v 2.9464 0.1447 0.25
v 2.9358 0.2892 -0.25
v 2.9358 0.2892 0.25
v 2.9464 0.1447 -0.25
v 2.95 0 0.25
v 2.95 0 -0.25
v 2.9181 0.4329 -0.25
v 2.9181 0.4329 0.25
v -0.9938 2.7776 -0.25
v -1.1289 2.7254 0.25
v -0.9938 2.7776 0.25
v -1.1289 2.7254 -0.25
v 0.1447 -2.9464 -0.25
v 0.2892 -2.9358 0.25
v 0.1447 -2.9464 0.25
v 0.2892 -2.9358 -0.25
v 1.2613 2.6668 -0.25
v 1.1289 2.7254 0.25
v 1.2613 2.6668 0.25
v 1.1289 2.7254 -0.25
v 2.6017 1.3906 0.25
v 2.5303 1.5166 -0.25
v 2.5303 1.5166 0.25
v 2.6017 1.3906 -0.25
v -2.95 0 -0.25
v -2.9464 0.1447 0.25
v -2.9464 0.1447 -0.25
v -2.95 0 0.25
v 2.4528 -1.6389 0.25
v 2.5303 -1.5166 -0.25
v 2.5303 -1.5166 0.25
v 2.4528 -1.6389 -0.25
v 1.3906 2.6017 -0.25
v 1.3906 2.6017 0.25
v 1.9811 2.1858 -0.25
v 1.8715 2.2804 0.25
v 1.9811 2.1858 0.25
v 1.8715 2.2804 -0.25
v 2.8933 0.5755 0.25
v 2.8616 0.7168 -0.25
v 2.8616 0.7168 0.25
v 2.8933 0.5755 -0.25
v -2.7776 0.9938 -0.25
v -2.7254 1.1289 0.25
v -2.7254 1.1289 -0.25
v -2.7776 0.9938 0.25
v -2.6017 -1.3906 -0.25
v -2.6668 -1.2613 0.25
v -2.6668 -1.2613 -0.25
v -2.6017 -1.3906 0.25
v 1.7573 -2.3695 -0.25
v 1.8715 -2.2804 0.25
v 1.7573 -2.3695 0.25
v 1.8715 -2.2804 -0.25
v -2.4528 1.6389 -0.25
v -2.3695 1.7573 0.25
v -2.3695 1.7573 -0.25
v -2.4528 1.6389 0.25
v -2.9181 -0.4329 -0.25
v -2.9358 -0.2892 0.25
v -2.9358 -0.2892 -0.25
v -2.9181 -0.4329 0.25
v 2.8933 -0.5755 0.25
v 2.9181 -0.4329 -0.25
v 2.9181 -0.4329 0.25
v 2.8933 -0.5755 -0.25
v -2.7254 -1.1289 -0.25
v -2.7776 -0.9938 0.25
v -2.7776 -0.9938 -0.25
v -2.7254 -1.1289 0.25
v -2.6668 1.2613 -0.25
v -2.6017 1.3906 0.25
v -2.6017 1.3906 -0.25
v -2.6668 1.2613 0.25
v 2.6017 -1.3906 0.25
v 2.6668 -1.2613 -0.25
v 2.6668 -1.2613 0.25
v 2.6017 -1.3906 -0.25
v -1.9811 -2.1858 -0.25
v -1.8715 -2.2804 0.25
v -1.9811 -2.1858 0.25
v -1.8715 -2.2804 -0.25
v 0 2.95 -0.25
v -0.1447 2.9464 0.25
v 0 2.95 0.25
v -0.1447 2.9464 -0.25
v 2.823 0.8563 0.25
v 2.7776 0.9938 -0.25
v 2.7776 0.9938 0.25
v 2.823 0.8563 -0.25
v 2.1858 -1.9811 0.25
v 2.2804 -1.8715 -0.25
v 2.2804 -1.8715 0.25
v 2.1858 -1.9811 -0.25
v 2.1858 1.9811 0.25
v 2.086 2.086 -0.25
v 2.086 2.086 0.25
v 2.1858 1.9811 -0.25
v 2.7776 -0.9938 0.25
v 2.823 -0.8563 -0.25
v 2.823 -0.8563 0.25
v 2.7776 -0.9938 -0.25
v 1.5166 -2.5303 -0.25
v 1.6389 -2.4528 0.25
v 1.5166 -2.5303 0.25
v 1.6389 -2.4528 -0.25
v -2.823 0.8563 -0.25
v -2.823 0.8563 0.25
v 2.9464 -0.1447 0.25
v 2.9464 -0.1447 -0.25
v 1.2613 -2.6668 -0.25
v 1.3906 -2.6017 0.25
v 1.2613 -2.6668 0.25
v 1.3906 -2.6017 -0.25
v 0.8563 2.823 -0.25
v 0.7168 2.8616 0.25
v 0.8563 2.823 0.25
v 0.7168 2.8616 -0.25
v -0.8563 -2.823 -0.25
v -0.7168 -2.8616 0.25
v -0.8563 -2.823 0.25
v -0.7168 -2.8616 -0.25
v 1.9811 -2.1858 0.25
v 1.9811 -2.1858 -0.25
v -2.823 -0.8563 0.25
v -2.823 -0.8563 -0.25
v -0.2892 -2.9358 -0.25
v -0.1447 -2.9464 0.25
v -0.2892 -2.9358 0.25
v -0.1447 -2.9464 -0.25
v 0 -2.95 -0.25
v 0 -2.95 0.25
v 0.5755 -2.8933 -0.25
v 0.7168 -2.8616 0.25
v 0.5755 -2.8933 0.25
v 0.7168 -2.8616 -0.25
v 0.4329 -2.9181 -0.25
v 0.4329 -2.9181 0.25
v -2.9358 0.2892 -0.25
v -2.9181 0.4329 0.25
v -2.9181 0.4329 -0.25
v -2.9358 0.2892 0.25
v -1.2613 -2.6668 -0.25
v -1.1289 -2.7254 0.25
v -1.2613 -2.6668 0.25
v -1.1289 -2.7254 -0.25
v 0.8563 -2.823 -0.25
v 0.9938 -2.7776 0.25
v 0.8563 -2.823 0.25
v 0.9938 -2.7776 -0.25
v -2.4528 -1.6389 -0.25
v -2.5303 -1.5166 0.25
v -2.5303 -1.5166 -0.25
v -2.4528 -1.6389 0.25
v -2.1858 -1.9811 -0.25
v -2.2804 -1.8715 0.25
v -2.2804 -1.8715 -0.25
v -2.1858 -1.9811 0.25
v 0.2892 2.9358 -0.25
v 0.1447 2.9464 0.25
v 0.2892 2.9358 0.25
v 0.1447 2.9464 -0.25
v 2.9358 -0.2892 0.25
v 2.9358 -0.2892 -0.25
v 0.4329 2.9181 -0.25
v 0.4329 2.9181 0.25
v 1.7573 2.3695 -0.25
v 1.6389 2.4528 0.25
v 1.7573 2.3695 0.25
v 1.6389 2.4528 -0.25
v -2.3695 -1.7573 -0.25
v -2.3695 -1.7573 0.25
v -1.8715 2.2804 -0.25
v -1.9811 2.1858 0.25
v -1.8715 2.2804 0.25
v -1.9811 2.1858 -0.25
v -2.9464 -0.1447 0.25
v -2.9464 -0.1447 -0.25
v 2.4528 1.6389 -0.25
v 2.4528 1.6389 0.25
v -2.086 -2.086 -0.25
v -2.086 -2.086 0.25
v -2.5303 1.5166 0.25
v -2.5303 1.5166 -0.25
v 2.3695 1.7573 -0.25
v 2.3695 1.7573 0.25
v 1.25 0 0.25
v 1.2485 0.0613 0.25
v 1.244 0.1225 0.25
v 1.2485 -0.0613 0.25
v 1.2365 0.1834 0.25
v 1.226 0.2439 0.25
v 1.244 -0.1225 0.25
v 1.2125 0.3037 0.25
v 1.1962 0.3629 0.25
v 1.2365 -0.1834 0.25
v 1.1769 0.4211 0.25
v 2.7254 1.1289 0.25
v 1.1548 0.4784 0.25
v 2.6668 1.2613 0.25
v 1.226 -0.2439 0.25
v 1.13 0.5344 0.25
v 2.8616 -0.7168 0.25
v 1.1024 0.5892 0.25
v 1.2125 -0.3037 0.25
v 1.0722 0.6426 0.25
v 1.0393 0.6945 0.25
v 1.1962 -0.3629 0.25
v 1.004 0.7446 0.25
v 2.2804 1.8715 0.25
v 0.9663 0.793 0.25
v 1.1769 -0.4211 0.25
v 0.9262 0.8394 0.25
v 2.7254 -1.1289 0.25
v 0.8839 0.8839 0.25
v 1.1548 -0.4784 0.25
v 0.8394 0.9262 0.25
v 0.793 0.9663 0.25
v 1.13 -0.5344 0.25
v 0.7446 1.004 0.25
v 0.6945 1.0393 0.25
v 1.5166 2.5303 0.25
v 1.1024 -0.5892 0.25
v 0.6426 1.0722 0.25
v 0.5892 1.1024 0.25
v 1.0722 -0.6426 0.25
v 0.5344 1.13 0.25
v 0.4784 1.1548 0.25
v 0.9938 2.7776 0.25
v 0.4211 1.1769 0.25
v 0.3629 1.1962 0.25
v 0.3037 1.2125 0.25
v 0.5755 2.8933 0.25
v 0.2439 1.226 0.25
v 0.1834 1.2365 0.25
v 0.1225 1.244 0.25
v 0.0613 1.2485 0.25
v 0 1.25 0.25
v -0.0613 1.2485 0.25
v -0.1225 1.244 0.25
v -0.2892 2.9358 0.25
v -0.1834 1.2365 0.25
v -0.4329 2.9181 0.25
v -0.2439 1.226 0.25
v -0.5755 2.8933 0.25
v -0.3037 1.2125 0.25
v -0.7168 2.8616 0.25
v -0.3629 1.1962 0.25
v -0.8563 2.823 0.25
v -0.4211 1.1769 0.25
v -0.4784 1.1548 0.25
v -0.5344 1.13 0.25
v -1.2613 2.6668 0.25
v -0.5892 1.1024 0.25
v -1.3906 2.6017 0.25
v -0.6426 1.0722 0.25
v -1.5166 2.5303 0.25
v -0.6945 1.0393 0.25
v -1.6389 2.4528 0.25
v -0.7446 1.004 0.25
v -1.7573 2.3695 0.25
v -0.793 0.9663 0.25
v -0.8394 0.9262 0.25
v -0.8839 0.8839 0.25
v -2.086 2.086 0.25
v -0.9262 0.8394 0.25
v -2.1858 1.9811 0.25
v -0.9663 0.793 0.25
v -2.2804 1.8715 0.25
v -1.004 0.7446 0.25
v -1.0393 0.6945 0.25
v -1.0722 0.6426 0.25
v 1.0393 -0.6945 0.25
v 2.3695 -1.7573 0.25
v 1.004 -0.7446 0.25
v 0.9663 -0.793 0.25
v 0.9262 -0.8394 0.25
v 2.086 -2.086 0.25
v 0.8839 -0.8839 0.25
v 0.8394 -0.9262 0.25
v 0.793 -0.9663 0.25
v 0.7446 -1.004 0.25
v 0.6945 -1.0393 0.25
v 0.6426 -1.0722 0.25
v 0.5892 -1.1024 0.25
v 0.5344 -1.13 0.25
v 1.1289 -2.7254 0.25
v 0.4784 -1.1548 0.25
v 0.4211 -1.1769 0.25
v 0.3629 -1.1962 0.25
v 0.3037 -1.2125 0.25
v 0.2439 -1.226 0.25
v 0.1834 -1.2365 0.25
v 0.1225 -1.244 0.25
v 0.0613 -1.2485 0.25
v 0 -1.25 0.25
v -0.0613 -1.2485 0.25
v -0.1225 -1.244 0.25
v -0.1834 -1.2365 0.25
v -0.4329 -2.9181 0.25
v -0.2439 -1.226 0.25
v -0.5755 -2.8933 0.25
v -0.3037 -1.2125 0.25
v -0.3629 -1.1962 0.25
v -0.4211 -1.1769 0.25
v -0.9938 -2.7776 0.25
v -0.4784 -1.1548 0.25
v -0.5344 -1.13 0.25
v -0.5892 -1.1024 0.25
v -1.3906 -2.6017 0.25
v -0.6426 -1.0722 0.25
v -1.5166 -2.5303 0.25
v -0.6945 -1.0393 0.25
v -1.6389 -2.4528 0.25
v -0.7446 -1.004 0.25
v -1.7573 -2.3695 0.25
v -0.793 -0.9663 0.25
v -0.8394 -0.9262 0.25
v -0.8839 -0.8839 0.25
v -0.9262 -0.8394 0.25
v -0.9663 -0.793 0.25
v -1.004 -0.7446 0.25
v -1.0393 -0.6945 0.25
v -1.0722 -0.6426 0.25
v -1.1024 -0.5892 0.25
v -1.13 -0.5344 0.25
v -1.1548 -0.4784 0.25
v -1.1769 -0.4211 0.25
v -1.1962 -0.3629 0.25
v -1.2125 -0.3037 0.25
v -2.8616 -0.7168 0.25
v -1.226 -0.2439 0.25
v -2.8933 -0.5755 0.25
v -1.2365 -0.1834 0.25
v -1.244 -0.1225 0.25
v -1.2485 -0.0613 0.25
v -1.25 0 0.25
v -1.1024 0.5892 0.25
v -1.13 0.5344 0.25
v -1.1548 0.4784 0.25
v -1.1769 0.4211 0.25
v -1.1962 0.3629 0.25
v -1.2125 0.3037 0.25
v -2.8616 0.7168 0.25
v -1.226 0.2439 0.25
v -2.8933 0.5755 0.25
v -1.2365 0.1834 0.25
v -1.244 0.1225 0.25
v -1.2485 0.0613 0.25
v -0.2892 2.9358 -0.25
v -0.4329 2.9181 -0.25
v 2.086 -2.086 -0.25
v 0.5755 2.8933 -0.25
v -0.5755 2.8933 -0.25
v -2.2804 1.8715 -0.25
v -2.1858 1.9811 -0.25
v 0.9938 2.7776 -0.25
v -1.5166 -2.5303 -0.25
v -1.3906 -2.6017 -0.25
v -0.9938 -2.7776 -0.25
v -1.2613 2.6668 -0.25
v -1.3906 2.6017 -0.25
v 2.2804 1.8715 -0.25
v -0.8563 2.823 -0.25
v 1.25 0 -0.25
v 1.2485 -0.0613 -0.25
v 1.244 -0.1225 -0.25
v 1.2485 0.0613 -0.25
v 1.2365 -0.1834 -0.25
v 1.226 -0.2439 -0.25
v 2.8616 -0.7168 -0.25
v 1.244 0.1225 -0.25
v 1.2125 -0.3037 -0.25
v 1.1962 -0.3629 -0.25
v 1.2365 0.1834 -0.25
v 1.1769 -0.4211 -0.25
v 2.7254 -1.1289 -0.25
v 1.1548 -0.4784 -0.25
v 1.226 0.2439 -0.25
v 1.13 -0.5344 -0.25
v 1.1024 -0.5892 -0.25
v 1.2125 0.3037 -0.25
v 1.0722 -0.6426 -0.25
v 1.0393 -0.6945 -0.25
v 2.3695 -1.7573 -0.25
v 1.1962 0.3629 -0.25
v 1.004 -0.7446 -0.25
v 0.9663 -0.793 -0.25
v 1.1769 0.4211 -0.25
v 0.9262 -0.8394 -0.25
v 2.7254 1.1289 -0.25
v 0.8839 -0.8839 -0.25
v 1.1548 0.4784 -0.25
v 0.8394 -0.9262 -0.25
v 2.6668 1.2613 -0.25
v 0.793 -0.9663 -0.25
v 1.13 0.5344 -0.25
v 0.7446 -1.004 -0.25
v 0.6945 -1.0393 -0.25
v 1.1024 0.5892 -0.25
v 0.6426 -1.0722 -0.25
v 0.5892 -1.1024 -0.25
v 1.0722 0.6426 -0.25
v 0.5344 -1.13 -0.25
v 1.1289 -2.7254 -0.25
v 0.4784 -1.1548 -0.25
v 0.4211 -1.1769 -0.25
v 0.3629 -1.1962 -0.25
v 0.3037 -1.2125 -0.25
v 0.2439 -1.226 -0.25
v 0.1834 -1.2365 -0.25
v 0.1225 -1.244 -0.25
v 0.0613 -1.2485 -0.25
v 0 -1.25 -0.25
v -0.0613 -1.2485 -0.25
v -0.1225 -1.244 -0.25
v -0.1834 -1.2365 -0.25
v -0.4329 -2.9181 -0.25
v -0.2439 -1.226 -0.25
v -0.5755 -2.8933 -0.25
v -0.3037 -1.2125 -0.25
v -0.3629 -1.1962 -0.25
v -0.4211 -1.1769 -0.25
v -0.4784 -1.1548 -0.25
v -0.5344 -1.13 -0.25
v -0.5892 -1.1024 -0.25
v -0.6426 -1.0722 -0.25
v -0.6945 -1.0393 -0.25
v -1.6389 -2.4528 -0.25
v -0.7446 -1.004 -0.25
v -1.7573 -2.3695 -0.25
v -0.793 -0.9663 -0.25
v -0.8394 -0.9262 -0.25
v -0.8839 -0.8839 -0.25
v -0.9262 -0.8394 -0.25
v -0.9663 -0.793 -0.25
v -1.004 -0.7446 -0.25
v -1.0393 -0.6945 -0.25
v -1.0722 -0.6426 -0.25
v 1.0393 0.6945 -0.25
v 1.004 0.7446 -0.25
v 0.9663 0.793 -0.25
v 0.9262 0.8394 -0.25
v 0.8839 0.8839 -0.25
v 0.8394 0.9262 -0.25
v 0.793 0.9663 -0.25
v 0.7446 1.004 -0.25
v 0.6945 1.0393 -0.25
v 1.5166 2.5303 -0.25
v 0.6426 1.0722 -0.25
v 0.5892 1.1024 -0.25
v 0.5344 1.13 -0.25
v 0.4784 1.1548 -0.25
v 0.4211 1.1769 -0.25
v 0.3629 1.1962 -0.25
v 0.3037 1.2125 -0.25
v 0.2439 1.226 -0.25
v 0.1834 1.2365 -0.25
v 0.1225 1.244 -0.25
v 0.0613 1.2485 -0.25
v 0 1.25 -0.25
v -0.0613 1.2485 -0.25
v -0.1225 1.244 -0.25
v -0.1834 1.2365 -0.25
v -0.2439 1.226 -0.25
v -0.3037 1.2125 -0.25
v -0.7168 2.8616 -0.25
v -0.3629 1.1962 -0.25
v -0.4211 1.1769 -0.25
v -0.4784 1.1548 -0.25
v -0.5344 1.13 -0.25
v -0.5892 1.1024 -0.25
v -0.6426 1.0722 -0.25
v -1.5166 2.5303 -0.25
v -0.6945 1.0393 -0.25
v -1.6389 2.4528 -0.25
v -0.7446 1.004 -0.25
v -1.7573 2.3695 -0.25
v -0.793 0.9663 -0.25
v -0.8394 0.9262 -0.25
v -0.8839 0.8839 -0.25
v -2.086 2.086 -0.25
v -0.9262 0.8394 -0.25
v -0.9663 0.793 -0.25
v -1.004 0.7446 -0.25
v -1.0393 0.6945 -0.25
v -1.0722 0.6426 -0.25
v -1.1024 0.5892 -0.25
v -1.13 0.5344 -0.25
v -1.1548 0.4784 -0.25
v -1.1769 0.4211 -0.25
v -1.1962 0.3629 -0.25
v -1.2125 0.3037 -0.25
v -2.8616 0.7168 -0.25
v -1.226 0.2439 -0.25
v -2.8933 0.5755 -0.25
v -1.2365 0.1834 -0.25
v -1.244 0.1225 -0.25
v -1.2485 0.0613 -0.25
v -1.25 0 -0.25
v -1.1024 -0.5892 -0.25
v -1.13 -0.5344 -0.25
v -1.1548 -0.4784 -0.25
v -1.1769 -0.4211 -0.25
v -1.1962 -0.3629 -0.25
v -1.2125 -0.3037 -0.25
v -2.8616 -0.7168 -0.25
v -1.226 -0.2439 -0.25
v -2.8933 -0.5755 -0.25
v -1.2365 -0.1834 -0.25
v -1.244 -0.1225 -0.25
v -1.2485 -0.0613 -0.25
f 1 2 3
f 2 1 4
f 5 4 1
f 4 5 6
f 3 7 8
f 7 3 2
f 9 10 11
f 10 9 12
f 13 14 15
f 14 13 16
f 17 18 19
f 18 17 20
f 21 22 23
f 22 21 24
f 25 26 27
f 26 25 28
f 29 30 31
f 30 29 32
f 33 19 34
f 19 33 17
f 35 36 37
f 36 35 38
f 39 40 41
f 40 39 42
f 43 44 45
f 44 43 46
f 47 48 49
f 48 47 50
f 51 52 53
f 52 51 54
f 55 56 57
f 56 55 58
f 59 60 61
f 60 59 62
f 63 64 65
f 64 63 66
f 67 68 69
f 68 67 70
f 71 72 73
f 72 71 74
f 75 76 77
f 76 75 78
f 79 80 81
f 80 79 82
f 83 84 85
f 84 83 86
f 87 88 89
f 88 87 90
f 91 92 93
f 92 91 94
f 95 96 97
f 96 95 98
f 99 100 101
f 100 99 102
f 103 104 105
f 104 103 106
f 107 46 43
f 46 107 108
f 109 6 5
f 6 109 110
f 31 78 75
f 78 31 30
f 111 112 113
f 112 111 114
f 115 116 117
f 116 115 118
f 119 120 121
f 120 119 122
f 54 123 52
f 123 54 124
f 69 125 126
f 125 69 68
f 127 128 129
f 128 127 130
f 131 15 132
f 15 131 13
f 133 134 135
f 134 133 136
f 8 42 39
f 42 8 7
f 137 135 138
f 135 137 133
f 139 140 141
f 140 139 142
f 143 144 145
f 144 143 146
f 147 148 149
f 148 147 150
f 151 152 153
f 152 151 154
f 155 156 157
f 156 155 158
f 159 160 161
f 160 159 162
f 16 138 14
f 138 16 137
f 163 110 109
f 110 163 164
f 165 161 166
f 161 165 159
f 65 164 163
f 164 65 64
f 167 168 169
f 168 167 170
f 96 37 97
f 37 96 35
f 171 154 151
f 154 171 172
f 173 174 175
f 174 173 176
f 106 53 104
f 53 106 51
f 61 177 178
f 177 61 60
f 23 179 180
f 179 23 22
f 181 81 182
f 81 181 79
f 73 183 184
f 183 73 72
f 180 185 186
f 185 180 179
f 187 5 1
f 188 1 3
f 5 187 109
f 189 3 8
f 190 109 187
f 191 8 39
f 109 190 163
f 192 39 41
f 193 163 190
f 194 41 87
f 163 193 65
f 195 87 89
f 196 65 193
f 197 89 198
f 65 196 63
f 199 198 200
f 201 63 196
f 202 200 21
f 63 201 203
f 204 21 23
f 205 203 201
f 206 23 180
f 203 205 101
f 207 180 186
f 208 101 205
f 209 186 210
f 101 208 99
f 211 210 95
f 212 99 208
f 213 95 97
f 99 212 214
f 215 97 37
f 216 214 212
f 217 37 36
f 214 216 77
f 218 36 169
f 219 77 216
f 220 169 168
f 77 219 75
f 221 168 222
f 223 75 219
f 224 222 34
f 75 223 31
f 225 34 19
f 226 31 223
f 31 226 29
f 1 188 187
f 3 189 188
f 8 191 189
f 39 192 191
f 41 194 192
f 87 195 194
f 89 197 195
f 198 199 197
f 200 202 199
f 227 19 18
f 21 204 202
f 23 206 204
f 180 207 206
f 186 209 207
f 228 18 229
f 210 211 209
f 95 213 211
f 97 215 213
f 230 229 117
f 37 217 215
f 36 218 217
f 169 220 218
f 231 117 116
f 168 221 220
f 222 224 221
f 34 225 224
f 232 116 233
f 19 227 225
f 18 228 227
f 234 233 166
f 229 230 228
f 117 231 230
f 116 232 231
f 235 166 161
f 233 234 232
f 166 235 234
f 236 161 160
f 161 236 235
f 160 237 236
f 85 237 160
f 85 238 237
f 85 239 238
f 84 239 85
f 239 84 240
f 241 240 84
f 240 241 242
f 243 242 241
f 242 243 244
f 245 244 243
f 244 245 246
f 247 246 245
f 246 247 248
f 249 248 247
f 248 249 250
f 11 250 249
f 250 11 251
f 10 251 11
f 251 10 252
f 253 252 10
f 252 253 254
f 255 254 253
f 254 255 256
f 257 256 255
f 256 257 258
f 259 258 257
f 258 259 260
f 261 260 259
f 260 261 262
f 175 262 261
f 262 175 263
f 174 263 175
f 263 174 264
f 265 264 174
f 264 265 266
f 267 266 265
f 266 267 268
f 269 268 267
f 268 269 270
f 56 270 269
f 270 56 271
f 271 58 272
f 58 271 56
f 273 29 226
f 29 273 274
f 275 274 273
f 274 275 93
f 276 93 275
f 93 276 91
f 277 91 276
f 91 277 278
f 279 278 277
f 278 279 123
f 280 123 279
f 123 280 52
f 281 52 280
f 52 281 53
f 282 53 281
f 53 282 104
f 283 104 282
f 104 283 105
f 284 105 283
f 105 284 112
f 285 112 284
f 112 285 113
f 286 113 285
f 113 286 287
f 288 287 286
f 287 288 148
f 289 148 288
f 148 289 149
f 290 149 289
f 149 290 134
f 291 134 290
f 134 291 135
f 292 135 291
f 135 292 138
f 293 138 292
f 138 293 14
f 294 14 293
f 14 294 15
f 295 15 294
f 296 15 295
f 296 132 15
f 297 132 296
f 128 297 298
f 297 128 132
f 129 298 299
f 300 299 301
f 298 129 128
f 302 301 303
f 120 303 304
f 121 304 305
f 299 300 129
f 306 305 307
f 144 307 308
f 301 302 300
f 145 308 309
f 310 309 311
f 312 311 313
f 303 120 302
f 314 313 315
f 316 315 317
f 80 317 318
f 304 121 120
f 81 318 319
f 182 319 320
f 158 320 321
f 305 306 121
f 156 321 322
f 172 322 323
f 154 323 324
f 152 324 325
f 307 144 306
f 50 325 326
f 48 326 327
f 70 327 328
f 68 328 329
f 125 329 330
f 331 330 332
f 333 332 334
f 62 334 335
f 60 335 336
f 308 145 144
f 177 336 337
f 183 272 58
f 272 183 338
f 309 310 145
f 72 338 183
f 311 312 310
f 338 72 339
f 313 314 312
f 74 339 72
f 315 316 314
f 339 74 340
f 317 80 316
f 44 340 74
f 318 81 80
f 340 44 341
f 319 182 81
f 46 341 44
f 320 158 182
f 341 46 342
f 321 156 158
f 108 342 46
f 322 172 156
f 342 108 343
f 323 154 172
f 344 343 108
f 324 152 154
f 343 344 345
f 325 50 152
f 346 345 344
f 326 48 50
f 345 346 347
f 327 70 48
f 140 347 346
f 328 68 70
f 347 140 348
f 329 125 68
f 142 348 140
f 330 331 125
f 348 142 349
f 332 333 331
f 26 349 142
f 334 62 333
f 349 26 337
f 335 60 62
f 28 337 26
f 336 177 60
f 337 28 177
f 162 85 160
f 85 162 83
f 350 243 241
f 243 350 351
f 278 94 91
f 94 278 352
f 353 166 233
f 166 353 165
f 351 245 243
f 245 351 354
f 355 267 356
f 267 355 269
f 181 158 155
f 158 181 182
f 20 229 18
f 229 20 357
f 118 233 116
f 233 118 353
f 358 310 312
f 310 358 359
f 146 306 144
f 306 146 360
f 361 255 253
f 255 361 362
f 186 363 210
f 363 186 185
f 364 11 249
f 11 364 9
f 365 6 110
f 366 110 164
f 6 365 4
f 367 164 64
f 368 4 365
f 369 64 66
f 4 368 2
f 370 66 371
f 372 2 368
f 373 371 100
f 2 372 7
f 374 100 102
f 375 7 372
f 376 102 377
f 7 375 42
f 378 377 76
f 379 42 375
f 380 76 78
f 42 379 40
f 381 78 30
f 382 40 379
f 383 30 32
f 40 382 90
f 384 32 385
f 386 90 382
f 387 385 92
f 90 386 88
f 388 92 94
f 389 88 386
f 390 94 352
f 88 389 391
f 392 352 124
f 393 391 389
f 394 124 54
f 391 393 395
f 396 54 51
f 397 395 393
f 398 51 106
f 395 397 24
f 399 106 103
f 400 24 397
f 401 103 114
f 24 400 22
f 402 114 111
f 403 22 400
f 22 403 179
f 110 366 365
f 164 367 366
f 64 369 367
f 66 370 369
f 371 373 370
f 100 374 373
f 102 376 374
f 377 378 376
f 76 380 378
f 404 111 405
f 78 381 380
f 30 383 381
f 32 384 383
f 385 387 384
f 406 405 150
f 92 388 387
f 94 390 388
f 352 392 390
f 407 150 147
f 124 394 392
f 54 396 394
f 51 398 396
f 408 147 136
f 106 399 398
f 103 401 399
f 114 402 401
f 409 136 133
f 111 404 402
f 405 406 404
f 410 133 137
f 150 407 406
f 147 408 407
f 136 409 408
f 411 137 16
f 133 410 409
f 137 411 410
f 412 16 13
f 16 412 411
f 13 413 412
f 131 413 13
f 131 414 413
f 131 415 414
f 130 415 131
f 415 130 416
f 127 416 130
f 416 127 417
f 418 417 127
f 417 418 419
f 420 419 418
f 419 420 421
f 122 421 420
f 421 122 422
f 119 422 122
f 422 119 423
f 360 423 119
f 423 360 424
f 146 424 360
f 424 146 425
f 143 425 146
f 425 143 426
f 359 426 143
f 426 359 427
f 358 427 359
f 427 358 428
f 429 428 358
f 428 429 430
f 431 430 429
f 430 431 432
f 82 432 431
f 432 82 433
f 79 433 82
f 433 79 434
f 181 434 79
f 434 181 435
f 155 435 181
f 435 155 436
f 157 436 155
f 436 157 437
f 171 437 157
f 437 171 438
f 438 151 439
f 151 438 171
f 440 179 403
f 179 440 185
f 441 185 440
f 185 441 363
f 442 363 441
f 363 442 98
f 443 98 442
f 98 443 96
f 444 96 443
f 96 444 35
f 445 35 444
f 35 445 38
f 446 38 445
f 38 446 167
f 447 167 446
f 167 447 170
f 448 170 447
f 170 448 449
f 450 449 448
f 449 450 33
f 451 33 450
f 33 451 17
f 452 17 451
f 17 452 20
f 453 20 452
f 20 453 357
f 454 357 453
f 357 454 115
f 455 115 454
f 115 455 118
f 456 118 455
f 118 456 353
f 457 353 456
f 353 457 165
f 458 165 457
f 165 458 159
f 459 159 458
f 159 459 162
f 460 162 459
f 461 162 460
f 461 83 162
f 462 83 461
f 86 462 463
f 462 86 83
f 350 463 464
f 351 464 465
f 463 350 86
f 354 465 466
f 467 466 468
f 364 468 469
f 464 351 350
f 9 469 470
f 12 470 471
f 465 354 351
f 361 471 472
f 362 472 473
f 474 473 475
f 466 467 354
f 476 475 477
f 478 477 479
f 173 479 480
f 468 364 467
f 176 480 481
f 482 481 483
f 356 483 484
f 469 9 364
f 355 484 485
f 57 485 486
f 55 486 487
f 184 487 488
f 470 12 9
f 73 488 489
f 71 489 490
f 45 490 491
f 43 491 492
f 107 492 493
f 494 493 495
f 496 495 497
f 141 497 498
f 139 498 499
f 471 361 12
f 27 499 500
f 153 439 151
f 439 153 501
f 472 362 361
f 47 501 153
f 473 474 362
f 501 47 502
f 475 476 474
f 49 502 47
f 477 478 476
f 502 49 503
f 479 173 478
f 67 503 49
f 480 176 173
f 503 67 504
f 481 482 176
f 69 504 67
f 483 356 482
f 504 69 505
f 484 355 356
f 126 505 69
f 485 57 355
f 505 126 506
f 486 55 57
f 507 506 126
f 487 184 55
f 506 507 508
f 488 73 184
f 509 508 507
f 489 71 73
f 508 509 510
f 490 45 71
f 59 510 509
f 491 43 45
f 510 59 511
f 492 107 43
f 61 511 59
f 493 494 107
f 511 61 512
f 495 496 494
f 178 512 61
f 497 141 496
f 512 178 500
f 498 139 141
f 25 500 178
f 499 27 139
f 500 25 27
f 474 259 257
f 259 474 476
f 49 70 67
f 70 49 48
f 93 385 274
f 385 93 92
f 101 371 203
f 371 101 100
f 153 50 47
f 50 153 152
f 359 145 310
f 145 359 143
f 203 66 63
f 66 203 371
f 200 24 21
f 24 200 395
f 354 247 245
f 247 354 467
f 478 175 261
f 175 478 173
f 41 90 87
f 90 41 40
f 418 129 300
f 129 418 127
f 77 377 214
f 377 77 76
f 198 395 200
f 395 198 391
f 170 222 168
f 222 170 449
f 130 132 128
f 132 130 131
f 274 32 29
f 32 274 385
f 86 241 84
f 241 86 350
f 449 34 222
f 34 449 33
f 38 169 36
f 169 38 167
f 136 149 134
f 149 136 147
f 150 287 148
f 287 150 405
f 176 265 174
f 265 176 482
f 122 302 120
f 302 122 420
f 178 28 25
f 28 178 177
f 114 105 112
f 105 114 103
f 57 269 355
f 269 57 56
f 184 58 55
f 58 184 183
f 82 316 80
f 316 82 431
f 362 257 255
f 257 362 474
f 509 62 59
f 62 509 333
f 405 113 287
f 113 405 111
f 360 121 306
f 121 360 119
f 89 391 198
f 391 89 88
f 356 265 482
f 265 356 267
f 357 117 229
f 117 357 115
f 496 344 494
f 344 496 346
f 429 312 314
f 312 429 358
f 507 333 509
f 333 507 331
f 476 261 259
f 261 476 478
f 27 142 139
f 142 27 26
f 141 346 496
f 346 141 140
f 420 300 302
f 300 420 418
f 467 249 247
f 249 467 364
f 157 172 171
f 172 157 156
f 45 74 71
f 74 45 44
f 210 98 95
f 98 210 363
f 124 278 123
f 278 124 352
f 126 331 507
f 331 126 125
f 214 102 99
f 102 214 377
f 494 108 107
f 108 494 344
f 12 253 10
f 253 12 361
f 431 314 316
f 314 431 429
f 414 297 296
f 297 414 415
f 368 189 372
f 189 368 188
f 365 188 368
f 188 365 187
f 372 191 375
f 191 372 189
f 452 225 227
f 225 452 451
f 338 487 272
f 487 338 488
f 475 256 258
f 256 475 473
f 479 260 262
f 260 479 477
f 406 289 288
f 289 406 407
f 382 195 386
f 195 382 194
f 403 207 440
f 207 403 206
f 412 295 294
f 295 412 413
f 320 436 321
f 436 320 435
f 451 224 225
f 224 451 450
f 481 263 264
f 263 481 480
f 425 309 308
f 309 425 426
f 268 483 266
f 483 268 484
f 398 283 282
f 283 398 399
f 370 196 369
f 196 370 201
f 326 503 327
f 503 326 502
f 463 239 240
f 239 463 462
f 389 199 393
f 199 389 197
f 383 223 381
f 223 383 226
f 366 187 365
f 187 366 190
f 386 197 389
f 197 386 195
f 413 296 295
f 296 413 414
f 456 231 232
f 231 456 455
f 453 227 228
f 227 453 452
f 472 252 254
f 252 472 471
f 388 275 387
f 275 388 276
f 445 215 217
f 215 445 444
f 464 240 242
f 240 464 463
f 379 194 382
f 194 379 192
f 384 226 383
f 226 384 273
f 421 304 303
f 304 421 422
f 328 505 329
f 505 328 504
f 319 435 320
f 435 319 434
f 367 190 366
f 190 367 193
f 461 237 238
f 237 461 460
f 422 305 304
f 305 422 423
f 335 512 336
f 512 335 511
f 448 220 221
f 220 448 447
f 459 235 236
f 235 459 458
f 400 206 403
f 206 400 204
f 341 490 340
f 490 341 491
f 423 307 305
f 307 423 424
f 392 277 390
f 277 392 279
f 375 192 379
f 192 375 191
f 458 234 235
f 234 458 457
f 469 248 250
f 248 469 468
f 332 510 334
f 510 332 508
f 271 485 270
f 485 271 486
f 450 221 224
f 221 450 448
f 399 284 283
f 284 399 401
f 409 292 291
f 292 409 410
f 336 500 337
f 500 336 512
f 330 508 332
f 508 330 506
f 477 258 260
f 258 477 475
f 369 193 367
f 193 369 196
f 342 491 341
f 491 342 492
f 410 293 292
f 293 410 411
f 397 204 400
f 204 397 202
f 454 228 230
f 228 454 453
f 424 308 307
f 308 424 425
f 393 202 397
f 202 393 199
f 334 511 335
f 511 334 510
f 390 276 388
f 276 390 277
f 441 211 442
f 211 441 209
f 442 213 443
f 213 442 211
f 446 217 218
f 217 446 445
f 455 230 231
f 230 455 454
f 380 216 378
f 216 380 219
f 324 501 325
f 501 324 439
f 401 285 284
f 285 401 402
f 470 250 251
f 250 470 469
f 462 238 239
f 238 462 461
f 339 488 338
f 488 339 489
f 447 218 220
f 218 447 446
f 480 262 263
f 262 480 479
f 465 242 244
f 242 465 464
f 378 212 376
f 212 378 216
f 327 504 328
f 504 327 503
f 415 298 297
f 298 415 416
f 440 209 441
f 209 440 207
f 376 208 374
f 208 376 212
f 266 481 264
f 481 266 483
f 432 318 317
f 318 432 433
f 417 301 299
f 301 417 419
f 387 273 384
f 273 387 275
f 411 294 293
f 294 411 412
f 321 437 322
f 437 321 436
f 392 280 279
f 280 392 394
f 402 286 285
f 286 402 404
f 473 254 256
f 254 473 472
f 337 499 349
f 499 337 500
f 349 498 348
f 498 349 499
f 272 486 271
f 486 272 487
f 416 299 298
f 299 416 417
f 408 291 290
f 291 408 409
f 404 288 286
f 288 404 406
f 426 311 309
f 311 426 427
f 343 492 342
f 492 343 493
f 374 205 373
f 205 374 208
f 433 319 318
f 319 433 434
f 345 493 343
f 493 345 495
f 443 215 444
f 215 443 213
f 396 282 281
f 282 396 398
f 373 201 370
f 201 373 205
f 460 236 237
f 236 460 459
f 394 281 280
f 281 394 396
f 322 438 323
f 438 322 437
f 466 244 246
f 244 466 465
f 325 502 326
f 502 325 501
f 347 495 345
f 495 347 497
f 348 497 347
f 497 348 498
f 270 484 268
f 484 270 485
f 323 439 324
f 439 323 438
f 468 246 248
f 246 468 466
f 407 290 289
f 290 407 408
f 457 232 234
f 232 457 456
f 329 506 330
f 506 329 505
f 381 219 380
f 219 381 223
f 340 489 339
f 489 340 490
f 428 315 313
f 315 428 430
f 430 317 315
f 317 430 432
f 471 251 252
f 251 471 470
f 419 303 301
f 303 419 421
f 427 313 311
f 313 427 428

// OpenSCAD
$fn=128;

module washer(id=2.5, od=5.9, thickness=0.5) {
    difference() {
        cylinder(h=thickness, d=od, center=true);
        cylinder(h=thickness + 0.2, d=id, center=true);
    }
}

washer();
